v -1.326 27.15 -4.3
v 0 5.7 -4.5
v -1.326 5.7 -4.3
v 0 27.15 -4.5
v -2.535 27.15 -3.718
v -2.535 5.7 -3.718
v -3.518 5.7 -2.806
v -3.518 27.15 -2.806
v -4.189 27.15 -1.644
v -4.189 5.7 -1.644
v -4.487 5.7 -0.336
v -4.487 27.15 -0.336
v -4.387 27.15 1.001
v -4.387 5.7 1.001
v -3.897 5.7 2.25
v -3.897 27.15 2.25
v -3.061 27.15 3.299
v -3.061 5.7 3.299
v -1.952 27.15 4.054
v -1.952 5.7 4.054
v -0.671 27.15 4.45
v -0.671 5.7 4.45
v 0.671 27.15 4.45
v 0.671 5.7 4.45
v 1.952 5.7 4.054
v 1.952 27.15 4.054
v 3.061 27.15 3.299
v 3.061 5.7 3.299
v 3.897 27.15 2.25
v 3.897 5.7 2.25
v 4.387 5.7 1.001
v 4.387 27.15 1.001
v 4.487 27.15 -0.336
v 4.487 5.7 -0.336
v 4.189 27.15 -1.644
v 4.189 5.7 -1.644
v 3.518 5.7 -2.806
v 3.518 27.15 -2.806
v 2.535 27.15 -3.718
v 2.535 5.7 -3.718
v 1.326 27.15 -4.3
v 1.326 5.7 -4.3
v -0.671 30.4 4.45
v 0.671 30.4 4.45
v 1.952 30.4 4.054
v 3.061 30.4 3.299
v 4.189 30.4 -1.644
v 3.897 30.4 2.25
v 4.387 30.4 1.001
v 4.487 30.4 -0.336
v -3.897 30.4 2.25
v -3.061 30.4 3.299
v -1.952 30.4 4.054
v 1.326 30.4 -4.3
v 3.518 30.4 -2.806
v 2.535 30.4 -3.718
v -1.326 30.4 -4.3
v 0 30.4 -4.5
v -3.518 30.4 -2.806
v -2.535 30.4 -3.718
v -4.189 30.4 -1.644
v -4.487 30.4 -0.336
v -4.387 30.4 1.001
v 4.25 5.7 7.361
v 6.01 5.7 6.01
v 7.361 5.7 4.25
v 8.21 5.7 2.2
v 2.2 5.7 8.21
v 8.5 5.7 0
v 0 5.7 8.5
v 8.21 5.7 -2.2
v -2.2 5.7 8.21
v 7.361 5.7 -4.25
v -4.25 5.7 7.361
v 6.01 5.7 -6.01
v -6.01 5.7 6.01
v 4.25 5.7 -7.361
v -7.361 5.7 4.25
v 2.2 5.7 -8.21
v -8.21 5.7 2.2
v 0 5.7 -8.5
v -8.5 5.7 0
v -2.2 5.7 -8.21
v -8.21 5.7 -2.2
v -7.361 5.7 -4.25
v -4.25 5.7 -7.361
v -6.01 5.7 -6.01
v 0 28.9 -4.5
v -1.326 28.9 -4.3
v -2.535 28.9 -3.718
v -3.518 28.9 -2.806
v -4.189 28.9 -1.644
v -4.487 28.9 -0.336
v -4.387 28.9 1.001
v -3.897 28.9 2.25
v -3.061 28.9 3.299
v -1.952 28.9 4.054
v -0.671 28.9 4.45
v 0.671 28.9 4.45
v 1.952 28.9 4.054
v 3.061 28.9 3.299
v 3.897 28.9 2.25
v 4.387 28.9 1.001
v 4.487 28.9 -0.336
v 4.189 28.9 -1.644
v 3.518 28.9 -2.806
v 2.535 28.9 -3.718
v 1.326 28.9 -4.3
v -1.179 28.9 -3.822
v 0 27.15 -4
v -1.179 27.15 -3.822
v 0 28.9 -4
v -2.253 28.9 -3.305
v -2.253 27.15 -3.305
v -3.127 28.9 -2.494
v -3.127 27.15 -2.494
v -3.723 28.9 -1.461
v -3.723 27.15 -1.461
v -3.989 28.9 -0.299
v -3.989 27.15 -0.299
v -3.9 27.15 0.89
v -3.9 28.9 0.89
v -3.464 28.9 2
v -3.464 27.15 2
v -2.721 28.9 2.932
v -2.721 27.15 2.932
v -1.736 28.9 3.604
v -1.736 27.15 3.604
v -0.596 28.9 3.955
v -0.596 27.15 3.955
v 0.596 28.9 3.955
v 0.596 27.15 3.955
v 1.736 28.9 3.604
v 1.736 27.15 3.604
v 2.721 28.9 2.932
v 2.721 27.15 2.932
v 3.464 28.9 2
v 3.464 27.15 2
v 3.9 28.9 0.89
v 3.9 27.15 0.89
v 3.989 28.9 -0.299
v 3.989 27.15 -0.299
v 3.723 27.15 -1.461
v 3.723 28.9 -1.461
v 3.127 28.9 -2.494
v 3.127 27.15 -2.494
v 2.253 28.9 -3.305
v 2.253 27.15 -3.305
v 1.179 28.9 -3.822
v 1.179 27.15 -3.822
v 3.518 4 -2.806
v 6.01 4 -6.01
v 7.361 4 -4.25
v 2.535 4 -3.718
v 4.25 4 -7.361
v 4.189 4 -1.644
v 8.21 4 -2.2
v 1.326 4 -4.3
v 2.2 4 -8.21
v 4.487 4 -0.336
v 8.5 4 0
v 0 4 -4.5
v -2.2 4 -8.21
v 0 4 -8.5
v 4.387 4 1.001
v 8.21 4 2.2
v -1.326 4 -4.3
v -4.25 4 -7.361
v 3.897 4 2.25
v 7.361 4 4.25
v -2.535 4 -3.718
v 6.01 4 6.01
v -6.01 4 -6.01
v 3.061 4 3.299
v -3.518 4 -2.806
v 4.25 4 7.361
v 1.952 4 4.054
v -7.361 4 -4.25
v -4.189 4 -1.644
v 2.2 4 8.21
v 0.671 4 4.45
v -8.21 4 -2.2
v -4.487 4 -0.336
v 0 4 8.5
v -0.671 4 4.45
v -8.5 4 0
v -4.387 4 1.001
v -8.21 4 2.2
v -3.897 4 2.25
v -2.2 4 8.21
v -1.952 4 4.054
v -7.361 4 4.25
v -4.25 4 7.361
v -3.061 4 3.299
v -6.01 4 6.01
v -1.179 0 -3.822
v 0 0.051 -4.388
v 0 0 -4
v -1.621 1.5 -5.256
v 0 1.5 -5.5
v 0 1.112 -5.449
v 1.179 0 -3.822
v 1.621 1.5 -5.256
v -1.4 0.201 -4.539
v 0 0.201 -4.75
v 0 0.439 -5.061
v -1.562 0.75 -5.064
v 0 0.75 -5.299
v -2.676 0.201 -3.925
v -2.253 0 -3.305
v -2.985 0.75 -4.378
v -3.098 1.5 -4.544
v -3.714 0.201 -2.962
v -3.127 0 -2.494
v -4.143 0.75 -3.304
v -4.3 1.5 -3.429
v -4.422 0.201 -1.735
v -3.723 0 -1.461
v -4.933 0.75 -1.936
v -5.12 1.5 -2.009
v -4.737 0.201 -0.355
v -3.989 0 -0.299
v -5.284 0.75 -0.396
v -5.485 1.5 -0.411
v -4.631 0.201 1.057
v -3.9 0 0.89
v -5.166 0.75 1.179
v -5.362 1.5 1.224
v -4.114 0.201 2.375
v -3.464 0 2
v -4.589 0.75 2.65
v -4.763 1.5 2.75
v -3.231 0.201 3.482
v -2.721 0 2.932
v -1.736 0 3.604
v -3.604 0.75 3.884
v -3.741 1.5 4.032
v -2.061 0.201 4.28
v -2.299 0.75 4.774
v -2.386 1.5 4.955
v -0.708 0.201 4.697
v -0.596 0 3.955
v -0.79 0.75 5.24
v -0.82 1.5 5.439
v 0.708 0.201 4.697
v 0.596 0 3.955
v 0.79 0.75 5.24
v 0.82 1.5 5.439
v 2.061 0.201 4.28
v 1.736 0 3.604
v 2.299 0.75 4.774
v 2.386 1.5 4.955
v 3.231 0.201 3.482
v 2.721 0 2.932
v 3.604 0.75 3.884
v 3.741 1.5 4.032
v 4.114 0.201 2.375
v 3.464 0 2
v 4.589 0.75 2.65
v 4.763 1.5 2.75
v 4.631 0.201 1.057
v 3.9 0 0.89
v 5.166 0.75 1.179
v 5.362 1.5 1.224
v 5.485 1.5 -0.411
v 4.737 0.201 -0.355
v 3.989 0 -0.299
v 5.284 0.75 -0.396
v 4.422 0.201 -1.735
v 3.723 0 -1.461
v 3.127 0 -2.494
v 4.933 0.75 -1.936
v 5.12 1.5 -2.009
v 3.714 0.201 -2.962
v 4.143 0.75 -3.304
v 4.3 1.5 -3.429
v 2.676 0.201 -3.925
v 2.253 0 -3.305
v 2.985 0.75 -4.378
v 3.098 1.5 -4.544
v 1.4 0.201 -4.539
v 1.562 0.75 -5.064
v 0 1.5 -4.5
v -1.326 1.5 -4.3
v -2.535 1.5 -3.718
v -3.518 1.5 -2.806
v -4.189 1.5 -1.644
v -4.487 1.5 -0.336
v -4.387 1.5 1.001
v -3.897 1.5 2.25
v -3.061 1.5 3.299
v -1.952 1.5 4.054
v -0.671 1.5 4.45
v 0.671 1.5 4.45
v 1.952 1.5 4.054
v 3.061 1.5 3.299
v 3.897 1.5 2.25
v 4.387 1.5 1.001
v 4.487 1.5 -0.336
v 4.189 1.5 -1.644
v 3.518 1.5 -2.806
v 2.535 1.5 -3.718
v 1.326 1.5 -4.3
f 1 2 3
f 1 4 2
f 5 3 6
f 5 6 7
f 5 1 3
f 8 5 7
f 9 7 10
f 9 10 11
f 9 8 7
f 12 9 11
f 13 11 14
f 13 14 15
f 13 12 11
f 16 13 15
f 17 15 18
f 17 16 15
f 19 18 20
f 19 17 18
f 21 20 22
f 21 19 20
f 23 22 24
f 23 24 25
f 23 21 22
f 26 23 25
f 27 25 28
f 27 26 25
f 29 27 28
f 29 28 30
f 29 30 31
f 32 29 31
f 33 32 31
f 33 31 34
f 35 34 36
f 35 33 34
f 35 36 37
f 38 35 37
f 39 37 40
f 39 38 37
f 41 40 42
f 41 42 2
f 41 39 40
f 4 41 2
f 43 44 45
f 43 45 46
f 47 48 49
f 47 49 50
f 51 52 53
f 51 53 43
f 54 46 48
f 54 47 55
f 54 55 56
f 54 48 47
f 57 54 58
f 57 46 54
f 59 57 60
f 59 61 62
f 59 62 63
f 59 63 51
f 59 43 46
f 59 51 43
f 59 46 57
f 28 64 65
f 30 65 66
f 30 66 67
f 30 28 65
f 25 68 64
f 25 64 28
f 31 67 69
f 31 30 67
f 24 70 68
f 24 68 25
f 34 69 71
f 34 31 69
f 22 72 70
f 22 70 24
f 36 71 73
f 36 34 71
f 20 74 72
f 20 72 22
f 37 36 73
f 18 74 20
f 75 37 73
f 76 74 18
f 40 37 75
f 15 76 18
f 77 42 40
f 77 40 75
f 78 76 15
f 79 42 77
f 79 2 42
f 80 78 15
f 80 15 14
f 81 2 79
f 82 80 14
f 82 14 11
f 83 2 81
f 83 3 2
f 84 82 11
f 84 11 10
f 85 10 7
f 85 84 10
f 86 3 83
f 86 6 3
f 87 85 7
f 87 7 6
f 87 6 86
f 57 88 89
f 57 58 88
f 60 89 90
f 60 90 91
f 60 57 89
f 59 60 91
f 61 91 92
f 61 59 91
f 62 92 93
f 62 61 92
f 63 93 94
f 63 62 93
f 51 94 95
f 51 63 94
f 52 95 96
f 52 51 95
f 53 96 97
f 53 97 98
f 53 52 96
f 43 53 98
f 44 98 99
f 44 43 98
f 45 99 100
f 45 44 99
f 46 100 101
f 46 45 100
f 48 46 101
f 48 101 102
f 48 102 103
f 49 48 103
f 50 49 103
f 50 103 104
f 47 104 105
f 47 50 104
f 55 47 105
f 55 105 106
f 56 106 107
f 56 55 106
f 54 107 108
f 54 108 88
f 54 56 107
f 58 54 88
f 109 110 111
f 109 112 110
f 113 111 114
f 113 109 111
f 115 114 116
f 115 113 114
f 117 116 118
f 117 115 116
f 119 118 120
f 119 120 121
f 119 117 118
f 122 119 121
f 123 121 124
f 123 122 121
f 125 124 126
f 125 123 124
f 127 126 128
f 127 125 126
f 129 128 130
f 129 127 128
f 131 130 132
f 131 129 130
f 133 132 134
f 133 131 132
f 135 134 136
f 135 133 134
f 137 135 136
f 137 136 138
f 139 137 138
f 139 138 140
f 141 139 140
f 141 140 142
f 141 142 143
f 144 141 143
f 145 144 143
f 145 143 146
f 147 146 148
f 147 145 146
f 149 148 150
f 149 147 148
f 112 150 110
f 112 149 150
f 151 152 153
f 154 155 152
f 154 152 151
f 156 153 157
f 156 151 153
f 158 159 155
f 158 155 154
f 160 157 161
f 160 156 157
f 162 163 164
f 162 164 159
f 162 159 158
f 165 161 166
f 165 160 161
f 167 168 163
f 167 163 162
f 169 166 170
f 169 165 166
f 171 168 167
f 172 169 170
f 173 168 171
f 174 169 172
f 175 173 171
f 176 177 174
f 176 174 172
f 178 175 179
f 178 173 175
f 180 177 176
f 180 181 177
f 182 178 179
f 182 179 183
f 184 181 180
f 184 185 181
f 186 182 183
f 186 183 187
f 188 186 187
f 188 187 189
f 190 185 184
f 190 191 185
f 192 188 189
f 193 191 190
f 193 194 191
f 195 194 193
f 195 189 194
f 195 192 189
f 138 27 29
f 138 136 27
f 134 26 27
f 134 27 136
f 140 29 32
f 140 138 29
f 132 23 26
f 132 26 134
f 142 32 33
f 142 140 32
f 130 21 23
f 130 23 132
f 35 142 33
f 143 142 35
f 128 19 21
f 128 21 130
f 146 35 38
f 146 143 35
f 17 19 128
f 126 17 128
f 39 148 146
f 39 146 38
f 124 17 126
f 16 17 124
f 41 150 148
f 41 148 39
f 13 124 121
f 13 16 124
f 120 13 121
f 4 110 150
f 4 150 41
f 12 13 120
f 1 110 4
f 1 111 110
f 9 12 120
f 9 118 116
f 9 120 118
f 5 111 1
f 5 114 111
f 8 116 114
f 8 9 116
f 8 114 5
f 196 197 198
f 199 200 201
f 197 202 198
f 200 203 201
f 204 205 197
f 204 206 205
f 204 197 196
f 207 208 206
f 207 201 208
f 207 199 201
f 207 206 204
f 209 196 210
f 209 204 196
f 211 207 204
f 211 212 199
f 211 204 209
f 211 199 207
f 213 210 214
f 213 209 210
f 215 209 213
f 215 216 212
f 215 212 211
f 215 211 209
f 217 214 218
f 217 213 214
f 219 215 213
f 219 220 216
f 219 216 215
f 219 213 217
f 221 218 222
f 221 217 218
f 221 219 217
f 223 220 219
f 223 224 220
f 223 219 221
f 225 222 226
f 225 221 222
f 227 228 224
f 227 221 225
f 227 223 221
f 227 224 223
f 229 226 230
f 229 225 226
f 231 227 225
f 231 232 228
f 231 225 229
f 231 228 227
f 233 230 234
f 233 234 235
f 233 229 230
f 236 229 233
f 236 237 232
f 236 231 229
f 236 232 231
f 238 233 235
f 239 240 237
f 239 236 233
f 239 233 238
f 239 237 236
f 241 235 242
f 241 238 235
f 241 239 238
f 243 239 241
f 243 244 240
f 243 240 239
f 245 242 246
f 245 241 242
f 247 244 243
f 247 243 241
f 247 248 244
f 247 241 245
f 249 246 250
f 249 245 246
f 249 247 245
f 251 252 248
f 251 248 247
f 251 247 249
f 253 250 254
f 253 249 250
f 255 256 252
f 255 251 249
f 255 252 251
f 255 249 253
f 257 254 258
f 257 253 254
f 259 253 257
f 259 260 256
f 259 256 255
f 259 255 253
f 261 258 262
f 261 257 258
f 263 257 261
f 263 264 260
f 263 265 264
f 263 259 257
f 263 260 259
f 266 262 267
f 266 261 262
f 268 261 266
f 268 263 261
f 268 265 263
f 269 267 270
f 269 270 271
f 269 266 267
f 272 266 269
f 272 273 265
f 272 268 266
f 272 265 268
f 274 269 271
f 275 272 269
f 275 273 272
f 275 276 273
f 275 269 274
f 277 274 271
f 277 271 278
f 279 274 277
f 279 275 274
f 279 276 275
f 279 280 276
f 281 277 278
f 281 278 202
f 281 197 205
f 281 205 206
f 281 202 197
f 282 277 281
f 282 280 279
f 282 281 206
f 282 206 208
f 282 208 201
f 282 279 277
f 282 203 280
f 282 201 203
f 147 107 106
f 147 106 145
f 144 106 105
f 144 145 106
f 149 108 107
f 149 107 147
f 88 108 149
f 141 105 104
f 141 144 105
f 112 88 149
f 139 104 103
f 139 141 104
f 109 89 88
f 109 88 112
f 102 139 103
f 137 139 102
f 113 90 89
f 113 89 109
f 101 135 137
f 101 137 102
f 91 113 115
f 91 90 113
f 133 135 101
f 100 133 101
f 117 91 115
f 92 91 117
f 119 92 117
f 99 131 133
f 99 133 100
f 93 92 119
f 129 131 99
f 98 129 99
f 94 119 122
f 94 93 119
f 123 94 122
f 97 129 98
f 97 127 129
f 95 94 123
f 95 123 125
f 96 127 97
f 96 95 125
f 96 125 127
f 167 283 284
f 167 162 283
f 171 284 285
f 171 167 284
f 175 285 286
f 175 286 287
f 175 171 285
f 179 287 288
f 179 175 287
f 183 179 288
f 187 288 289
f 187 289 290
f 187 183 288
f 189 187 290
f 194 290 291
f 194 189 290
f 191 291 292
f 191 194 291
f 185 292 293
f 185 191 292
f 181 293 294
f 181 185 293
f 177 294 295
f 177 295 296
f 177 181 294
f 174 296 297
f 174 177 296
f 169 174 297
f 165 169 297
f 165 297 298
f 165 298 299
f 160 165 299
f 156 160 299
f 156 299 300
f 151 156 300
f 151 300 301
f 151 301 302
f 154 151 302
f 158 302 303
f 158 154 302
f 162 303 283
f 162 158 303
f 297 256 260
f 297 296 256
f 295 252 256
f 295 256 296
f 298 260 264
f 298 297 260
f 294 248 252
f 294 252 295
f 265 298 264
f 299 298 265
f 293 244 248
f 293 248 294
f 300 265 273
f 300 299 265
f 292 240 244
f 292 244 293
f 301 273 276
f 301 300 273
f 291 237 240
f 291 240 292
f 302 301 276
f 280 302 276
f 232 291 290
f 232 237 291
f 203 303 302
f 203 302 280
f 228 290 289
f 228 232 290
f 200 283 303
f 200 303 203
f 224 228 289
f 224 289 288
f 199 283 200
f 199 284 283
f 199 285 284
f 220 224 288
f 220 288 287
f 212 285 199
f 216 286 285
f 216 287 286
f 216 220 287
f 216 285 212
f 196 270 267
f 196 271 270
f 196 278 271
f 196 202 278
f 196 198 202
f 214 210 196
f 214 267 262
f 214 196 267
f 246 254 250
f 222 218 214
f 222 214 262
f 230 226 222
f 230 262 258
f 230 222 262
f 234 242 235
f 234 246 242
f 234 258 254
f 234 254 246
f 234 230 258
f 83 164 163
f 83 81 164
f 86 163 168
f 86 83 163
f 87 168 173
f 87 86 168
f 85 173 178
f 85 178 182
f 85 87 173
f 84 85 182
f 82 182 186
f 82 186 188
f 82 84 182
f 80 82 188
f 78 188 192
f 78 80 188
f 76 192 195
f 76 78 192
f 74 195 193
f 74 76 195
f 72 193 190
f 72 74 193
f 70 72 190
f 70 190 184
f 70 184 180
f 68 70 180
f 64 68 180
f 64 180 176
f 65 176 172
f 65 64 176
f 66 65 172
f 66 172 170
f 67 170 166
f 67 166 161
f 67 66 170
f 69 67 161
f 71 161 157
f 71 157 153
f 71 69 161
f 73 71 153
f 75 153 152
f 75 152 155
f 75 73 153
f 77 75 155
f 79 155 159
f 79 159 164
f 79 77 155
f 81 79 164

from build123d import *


with BuildPart() as part:
    # Esboço1 → Revolução1 (revolve)
    with BuildSketch(Plane(origin=(0, 0, 0), x_dir=(0, 0, -1), z_dir=(1, 0, 0)), mode=Mode.PRIVATE) as revolu_o1_sk:
        with BuildLine():
            Line((0, 30.4), (0, 0))
            Line((0, 0), (-4, 0))
            ThreePointArc((-4, 0), (-5.060660172, 0.439339828), (-5.5, 1.5))
            Line((-5.5, 1.5), (-4.5, 1.5))
            Line((-4.5, 1.5), (-4.5, 4))
            Line((-4.5, 4), (-8.5, 4))
            Line((-8.5, 4), (-8.5, 5.7))
            Line((-8.5, 5.7), (-4.5, 5.7))
            Line((-4.5, 5.7), (-4.5, 27.15))
            Line((-4.5, 27.15), (-4, 27.15))
            Line((-4, 27.15), (-4, 28.9))
            Line((-4, 28.9), (-4.5, 28.9))
            Line((-4.5, 28.9), (-4.5, 30.4))
            Line((-4.5, 30.4), (0, 30.4))
        make_face()
    revolve(revolu_o1_sk.sketch.rotate(Axis((0, 0, 0), (0, 1, 0)), 180), axis=Axis((0, 0, 0), (0, 1, 0)))


solid = part.part
